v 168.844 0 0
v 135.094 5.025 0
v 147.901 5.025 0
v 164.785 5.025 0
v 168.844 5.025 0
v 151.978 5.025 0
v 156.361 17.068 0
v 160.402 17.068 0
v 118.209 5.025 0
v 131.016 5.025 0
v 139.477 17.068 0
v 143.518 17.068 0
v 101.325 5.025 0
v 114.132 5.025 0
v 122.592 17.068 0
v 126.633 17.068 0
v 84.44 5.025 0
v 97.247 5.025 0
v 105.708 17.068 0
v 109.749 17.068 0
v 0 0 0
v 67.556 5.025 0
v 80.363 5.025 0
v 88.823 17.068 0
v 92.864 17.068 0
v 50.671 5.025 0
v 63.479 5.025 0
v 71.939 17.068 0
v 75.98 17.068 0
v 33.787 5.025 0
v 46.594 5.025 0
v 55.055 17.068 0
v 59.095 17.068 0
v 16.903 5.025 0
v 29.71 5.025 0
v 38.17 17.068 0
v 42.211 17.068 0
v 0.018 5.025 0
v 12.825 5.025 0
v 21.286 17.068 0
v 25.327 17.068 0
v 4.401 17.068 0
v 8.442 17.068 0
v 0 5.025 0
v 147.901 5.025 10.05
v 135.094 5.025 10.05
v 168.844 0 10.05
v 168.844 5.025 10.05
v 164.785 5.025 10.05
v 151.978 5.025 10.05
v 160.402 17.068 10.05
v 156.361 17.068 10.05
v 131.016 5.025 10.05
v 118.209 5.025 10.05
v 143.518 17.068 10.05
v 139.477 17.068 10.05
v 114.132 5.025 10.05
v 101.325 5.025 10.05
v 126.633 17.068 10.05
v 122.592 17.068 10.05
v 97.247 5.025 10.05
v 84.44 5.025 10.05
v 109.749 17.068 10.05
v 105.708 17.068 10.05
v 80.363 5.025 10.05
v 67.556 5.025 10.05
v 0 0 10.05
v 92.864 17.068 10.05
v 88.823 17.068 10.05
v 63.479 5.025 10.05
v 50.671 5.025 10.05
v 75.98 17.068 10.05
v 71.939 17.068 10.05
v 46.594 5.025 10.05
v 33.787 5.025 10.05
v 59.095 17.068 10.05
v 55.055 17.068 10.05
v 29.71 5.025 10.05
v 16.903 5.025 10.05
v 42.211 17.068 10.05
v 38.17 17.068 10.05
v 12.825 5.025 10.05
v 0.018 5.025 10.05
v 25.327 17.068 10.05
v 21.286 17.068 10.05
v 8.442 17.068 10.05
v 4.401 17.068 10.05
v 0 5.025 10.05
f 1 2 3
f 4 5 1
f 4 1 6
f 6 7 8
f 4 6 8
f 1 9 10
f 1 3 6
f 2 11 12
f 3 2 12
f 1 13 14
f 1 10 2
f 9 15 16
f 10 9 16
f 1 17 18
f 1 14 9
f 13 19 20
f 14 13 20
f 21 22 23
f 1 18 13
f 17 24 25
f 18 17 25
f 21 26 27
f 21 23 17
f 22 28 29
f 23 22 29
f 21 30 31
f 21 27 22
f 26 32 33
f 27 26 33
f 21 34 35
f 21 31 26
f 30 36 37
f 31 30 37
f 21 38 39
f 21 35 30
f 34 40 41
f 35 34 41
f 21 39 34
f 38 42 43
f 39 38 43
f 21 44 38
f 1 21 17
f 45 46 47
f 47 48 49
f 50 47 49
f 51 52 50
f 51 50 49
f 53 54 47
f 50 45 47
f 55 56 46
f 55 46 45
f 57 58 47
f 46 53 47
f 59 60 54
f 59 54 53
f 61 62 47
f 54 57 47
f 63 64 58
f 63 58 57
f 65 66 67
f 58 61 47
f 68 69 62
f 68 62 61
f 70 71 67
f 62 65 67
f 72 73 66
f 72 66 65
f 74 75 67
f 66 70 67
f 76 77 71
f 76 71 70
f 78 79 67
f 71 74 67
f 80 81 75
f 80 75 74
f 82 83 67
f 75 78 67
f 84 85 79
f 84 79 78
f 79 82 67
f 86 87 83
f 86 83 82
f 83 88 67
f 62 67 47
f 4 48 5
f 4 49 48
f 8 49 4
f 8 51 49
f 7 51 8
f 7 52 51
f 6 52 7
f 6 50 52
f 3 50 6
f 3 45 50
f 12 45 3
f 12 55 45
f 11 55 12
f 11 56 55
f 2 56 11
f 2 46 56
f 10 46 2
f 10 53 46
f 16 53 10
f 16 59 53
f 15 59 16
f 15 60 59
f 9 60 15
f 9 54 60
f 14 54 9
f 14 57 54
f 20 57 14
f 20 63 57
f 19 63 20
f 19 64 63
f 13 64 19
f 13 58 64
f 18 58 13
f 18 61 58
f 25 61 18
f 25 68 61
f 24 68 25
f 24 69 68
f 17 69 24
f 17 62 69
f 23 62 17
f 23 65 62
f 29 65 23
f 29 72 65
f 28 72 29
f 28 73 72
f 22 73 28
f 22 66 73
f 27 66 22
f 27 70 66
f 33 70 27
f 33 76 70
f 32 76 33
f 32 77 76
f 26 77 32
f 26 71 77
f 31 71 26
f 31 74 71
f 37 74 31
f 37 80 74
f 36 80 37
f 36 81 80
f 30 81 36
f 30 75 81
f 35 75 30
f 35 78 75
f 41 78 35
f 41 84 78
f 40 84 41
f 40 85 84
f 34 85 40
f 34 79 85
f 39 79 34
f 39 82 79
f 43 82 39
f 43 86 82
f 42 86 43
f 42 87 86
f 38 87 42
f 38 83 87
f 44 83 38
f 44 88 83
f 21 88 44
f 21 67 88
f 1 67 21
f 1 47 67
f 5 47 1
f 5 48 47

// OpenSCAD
// file: utils.scad
//------------------------------------------------------------------
/*

Utility Functions/Definitions

*/
//-----------------------------------------------------------------
// scaling

desired_scale = 1;
mm_per_inch = 25.4;
al_shrink = 1/0.99; // ~1%
pla_shrink = 1/0.998; //~0.2%
abs_shrink = 1/0.995; //~0.5%

function scale(x) = x * desired_scale * abs_shrink;

//------------------------------------------------------------------
// control the number of facets on cylinders

facet_epsilon = 0.01;
function facets(r) = 180 / acos(1 - (facet_epsilon / r));

// small tweak to avoid differencing artifacts
epsilon = 0.05;

//------------------------------------------------------------------

pi = 3.1415926535;

// degrees to radians
function d2r(d) = (d * pi) / 180;

// radians to degrees
function r2d(r) = (180 * r) / pi;

//------------------------------------------------------------------
// rounded/filleted edges

module inverse() {
  difference() {
    square(1e5, center=true);
    children(0);
  }
}

module rounded(r=1) {
  offset(r=r, $fn=facets(r)) offset(r=-r, $fn=facets(r)) children(0);
}

module filleted(r=1) {
  offset(r=-r, $fn=facets(r)) render() offset(r=r, $fn=facets(r)) children(0);
}

//------------------------------------------------------------------
// main file
//------------------------------------------------------------------

include <utils.scad>;
use <gears.scad>;

//------------------------------------------------------------------

gear_module = scale(16.8/pi);
pressure_angle = 20;
gear_backlash = scale(0);
gear_clearance = scale(0);
involute_facets = 10;

sg_height = scale(10);
sg1_teeth = 16;
sg2_teeth = 12;

hub_radius = scale(20/2);
hub_height = scale(2);

hole_radius = scale(9.525/2); // 3/8"

//------------------------------------------------------------------

module stacked_gears() {
  difference() {
    union() {
      // 16 tooth spur gear
      sg1_pd = gear_module * sg1_teeth;
      spur_gear(
        number_teeth = sg1_teeth,
        pitch_diameter = sg1_pd,
        pressure_angle = pressure_angle,
        backlash = gear_backlash,
        clearance = gear_clearance,
        ring_width = sg1_pd / 2,
        involute_facets = involute_facets,
        height = sg_height
      );
      // 12 tooth spur gear
      sg2_pd = gear_module * sg2_teeth;
      translate([0,0,sg_height - epsilon]) {
        spur_gear(
          number_teeth = sg2_teeth,
          pitch_diameter = sg2_pd,
          pressure_angle = pressure_angle,
          backlash = gear_backlash,
          clearance = gear_clearance,
          ring_width = sg2_pd / 2,
          involute_facets = involute_facets,
          height = sg_height + epsilon
        );
      }
      // hub to reduce friction
      translate([0,0,(2 * sg_height) - epsilon]) {
        cylinder(r=hub_radius, h=hub_height + epsilon, $fn = facets(hub_radius));
      }
    }
    translate([0,0,-epsilon]) {
        cylinder(
          r=hole_radius,
          h=hub_height + (2 * sg_height) + 2 * epsilon,
          $fn = facets(hub_radius)
        );
    }
  }
}

//------------------------------------------------------------------

module crown_rack() {
  rack(
    number_teeth = 10,
    gear_module = gear_module,
    pressure_angle = pressure_angle,
    backlash = gear_backlash,
    base_height = scale(5),
    base_width = sg_height
  );
}

//------------------------------------------------------------------

crown_rack();
//stacked_gears();

//------------------------------------------------------------------
